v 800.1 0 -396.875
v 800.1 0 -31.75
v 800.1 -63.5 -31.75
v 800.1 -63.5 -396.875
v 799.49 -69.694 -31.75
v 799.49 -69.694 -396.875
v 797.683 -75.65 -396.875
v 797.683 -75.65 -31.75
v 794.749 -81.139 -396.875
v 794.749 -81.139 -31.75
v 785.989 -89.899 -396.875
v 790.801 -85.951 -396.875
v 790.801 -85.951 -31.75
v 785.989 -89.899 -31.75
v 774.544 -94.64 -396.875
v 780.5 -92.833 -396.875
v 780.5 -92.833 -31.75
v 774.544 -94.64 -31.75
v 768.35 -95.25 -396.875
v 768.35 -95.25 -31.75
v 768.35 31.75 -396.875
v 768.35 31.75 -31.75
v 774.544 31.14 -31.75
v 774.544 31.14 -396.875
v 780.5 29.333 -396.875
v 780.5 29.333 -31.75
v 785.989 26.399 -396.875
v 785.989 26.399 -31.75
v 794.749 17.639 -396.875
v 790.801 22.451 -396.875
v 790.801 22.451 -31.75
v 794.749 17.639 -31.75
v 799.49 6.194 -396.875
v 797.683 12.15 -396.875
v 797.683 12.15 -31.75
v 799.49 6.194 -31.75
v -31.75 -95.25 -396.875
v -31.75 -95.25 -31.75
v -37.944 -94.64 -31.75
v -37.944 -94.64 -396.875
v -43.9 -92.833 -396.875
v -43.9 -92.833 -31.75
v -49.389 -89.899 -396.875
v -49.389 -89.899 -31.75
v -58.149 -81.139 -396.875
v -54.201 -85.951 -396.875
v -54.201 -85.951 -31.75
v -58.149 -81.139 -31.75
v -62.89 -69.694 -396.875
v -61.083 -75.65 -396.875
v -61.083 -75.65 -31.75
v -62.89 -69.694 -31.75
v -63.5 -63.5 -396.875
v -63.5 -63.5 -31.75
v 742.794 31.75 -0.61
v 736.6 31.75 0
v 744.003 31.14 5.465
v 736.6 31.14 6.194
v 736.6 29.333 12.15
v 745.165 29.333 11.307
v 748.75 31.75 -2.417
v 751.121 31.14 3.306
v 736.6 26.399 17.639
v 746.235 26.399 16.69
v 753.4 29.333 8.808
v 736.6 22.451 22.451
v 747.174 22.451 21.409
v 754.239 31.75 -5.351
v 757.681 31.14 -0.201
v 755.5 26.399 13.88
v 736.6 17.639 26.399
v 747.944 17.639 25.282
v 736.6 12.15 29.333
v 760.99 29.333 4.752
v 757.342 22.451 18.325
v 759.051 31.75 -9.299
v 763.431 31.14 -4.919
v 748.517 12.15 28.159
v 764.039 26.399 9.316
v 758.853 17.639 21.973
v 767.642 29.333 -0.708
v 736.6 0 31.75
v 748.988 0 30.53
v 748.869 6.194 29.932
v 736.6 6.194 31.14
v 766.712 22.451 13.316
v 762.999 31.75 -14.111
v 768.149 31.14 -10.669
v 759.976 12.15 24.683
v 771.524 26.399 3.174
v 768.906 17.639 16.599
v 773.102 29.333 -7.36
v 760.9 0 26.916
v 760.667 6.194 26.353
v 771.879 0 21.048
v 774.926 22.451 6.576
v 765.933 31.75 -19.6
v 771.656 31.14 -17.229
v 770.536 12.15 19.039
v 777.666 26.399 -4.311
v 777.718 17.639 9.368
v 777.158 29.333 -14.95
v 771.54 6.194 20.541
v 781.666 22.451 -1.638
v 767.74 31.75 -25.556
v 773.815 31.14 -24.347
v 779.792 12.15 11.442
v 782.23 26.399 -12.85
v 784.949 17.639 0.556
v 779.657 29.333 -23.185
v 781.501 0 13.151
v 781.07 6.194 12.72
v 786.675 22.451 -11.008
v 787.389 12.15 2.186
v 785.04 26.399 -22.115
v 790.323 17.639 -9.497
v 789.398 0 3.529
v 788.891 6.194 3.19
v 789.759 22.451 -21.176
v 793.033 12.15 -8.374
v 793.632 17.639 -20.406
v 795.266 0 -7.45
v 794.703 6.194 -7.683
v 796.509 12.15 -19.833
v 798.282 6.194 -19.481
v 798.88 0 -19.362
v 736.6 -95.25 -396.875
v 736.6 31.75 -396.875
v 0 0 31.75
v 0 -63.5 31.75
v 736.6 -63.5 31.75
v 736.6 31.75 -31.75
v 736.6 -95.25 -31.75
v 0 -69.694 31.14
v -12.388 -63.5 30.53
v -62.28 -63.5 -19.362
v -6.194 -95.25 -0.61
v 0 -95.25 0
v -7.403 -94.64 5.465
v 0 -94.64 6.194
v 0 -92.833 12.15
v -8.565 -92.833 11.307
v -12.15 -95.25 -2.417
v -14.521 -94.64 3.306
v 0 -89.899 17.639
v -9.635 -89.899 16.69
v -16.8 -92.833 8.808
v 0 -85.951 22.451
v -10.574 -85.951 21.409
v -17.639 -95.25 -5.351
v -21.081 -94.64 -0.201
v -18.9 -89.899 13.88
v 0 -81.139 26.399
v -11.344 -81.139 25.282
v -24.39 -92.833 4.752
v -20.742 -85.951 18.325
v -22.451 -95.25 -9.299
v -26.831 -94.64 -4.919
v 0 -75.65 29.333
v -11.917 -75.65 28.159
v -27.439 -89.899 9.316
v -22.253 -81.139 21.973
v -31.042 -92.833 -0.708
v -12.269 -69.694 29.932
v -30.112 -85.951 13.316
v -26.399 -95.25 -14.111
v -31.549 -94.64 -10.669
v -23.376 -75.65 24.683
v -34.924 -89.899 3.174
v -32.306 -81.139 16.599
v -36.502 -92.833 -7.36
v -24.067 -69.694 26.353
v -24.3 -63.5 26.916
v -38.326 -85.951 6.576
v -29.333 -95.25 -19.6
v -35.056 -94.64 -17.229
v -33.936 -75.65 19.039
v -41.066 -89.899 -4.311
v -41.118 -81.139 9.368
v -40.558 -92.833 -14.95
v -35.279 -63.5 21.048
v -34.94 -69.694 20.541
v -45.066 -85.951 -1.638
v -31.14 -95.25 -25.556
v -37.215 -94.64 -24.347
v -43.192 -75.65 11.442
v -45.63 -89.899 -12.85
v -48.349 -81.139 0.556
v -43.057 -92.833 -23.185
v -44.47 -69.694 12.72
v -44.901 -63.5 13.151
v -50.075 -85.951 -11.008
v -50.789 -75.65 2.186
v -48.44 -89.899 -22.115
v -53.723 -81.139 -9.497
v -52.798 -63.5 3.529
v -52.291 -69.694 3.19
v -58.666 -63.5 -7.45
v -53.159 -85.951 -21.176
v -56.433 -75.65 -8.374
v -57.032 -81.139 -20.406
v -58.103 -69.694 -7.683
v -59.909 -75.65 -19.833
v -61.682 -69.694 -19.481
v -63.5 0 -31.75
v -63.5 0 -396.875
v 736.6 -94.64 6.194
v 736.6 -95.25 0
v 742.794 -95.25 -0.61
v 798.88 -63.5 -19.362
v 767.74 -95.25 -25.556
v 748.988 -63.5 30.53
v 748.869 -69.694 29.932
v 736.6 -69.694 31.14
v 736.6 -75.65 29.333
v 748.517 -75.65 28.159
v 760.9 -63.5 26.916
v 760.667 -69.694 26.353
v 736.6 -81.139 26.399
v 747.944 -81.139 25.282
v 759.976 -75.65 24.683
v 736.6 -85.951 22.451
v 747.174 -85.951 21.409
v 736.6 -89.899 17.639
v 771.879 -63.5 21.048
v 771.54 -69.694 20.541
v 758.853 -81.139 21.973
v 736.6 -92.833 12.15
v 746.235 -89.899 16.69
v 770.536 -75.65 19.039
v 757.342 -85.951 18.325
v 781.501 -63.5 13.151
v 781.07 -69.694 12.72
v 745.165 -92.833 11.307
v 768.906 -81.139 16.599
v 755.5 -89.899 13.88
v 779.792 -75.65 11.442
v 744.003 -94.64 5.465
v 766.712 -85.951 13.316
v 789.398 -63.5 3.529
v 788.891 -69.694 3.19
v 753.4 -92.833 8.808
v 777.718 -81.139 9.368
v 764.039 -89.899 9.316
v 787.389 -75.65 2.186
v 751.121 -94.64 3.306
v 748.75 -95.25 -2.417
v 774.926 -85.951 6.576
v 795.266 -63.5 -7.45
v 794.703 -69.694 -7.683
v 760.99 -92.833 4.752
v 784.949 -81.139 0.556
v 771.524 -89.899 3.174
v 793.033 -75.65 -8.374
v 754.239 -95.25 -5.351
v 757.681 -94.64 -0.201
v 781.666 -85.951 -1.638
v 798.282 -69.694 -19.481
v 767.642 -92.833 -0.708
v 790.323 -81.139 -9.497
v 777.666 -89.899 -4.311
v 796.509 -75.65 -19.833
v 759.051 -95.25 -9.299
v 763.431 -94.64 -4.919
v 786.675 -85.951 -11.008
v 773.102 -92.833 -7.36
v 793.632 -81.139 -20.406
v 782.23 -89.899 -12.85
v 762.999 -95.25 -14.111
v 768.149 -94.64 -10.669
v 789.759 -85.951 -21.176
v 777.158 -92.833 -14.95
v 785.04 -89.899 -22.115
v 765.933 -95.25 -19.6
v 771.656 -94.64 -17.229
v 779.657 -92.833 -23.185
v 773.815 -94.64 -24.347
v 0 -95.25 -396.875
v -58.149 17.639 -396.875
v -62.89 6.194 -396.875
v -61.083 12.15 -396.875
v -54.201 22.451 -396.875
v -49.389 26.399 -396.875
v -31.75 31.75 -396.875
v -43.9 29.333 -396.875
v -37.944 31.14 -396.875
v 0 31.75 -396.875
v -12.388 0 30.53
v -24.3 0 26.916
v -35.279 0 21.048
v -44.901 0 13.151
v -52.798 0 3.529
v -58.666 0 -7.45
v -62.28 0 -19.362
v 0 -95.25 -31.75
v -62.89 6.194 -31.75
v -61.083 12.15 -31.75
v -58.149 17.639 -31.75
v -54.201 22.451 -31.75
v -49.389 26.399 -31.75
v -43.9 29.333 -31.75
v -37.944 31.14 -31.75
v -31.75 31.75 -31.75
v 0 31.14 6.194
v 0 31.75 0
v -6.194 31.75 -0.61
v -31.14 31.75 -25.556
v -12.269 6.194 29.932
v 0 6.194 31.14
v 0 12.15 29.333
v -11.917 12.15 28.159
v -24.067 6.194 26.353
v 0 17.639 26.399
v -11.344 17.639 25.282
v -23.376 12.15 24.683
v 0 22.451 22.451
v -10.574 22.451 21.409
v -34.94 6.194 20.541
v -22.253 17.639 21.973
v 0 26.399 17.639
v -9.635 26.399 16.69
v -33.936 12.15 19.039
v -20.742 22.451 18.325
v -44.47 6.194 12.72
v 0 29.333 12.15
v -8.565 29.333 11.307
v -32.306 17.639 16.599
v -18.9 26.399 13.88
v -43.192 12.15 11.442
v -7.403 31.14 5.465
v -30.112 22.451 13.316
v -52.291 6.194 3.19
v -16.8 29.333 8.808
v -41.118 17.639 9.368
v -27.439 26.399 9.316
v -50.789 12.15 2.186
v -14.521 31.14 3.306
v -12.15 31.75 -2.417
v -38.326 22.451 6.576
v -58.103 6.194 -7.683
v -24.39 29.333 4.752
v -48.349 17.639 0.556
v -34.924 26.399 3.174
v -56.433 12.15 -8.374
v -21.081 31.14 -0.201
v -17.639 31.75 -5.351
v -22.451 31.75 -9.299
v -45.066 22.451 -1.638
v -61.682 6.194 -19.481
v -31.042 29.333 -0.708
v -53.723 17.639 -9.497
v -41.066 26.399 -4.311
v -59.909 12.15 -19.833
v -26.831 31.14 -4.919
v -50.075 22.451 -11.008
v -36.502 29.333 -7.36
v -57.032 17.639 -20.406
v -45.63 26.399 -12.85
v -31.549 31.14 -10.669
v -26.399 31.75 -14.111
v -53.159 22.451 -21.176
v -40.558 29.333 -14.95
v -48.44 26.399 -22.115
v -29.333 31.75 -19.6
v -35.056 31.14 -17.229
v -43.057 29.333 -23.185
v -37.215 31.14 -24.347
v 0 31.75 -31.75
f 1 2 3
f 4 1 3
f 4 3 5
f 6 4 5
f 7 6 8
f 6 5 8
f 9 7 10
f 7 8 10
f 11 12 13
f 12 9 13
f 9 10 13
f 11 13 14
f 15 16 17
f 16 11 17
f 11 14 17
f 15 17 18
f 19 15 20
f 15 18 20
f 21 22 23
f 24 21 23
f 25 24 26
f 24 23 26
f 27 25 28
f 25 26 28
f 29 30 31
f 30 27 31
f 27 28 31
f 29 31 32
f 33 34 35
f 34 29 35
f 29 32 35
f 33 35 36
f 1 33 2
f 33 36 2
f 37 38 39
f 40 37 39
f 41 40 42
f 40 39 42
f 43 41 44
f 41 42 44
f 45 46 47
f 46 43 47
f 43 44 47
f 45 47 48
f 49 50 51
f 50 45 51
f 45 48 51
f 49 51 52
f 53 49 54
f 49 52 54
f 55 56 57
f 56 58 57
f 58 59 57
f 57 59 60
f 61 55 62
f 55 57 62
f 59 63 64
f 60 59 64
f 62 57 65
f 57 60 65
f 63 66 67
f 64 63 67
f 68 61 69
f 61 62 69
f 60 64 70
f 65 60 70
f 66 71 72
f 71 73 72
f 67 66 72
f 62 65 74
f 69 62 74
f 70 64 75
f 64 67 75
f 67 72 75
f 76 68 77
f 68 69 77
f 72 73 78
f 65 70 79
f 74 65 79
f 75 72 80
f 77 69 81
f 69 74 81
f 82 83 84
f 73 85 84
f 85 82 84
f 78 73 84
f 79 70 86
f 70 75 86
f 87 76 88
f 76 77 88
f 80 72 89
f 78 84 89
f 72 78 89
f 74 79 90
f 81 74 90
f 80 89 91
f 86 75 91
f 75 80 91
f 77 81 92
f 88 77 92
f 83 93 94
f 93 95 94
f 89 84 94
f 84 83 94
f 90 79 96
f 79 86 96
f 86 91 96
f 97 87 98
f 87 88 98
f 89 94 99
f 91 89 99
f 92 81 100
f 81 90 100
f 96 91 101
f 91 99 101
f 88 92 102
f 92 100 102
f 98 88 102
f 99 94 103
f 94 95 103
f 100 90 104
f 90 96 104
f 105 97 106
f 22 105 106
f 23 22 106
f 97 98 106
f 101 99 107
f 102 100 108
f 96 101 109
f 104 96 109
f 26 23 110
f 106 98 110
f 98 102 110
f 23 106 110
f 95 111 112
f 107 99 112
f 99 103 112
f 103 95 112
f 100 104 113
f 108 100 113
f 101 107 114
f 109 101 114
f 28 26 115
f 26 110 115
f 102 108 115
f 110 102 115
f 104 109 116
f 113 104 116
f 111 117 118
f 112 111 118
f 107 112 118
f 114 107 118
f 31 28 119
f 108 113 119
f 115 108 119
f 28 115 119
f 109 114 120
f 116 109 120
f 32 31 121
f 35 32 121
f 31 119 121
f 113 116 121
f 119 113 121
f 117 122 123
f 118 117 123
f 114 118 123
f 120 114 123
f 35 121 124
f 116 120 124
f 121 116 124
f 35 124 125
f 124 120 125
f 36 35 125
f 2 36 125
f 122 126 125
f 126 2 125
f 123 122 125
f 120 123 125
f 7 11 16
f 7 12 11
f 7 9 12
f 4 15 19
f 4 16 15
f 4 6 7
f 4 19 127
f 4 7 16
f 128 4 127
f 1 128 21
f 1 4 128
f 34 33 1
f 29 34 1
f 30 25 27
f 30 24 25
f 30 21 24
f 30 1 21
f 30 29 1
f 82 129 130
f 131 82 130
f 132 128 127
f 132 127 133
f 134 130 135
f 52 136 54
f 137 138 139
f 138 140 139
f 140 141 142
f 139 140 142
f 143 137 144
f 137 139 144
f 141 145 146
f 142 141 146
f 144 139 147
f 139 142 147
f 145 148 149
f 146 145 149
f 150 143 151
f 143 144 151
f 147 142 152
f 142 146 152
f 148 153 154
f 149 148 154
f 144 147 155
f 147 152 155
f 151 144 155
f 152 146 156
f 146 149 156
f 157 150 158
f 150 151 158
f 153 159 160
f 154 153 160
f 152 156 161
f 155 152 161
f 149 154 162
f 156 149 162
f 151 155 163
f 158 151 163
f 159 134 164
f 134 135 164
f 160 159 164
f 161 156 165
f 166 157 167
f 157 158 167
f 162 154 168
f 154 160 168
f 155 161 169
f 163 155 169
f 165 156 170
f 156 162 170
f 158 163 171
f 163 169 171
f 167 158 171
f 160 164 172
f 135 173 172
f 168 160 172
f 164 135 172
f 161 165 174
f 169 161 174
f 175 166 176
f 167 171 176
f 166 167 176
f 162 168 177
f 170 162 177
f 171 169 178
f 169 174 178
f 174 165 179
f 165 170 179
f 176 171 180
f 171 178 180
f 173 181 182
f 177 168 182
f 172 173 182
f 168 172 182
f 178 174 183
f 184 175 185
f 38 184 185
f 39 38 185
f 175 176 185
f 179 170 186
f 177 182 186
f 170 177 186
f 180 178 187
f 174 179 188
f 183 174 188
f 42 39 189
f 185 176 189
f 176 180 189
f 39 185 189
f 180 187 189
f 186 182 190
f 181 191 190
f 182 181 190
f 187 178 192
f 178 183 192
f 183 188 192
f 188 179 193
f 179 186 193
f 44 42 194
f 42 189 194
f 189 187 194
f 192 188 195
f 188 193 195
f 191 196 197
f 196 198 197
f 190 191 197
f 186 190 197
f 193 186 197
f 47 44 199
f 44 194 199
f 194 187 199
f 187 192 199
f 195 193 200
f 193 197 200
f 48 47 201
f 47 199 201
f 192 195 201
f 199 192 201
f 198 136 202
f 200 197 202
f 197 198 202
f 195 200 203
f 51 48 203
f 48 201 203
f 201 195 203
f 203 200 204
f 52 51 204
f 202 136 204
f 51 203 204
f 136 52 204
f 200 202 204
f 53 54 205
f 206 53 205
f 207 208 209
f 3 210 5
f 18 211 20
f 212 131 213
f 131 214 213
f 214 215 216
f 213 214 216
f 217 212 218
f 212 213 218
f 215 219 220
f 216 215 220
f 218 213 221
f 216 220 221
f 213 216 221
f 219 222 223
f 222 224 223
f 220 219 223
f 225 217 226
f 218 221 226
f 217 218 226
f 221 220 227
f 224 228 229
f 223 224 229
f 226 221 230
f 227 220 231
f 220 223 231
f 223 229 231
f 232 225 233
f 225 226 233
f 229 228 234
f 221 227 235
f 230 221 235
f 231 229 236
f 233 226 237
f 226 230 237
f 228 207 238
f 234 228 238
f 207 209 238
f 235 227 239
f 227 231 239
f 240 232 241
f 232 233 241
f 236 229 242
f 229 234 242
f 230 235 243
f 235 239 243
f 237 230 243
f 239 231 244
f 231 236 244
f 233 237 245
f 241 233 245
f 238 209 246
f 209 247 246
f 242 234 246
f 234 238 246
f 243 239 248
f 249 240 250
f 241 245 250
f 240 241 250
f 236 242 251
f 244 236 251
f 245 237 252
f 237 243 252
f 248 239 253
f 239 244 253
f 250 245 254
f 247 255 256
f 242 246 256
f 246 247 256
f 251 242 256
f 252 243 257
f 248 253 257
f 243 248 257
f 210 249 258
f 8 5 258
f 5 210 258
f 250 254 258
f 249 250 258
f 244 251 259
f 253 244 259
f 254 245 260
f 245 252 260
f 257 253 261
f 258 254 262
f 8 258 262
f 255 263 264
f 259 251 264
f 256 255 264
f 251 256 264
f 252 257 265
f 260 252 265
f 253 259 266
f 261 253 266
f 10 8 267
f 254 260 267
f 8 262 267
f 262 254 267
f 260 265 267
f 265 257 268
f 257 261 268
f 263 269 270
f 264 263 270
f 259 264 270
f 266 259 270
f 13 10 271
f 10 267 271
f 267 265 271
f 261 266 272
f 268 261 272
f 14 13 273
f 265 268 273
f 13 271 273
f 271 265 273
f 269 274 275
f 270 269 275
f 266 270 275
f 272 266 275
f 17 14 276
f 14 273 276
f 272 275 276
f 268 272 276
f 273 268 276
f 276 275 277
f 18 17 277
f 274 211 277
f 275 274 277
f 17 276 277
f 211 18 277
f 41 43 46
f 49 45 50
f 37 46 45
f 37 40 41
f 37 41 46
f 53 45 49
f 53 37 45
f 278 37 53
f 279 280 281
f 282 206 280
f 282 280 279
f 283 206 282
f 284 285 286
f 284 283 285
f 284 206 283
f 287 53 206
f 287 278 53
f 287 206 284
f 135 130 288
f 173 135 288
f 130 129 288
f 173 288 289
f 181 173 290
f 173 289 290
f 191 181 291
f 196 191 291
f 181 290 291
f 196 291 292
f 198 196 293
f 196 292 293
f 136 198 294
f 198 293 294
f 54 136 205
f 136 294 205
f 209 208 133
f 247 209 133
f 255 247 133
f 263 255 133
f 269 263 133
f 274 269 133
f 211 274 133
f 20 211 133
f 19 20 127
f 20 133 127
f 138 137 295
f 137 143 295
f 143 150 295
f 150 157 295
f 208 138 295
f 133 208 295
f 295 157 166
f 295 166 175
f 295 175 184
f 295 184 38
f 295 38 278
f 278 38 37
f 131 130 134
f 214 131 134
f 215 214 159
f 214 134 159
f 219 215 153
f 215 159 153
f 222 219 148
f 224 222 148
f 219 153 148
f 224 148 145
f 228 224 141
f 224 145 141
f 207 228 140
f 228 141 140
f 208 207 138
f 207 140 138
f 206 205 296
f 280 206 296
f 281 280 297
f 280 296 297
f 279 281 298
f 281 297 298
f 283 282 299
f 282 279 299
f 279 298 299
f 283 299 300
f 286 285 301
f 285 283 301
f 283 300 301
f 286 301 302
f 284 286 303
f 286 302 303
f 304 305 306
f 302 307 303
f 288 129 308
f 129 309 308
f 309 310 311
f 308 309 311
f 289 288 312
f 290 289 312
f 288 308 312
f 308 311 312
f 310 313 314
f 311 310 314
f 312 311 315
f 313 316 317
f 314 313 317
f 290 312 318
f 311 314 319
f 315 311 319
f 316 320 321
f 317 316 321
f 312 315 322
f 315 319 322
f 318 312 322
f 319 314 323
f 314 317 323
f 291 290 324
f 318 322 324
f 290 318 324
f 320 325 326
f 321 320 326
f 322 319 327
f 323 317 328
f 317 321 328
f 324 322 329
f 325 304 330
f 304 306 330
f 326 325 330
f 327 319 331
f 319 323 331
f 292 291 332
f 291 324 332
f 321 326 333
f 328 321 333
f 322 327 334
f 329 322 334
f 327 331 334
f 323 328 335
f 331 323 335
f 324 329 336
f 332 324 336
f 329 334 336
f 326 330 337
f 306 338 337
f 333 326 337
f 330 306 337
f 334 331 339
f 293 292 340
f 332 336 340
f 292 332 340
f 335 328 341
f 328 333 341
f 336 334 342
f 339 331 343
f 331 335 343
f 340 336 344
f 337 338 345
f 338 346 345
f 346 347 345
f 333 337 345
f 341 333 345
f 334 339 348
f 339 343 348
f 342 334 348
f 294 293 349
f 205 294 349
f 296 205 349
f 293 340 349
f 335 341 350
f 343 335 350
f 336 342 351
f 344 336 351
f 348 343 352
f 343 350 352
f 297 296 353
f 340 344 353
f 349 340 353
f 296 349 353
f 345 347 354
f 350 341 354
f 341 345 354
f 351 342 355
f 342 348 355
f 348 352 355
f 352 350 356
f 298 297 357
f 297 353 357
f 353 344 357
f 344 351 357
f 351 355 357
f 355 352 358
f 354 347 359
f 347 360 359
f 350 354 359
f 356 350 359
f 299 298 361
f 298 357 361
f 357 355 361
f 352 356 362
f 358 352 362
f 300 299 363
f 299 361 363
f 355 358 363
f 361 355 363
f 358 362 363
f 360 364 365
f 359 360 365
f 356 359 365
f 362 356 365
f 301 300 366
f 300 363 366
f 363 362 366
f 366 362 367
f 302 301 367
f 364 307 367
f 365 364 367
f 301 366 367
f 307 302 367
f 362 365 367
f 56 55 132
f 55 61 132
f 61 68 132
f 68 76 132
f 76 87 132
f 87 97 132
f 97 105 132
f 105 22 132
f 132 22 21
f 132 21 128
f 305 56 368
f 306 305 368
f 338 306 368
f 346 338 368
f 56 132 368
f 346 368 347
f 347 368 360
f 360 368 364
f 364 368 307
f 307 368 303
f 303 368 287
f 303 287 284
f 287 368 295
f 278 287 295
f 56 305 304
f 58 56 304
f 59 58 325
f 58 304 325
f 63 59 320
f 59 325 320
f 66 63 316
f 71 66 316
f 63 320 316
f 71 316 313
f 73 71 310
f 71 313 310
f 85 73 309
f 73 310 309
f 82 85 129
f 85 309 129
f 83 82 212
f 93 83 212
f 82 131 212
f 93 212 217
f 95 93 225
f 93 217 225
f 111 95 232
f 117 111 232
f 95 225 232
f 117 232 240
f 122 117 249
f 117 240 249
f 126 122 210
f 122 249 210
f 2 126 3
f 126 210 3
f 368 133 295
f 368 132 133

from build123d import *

# Parameters (mm, degrees)
BOSS_EXTRUDE1_DEPTH = 736.6
REVOLVE13_ANGLE     = 90
REVOLVE12_ANGLE     = 90
BOSS_EXTRUDE3_DEPTH = 736.6
REVOLVE2_ANGLE      = 90
BOSS_EXTRUDE4_DEPTH = 736.6
REVOLVE10_ANGLE     = 90
BOSS_EXTRUDE5_DEPTH = 736.6
SKETCH16_W          = 434.975
SKETCH16_H          = 127
CUT_EXTRUDE1_DEPTH  = 1203.851588934


with BuildPart() as part:
    # Sketch1 → Boss-Extrude1 (new body)
    with BuildSketch(Plane(origin=(0, 0, 0), x_dir=(0, 0, -1), z_dir=(1, 0, 0))):
        with BuildLine():
            ThreePointArc((0, 31.75), (-22.450640303, 22.450640303), (-31.75, 0))
            Line((-31.75, 0), (-31.75, -63.5))
            ThreePointArc((-31.75, -63.5), (-22.450640303, -85.950640303), (0, -95.25))
            Line((0, -95.25), (31.75, -95.25))
            Line((31.75, -95.25), (31.75, 0))
            Line((31.75, 0), (31.75, 31.75))
            Line((31.75, 31.75), (0, 31.75))
        make_face()
    extrude(amount=BOSS_EXTRUDE1_DEPTH)



with BuildPart() as body_2:
    # Sketch8 → Revolve13 (revolve)
    with BuildSketch(Plane(origin=(736.6, 0, 0), x_dir=(0, 0, -1), z_dir=(1, 0, 0))):
        with BuildLine():
            Line((-31.75, 0), (-31.75, -63.5))
            ThreePointArc((-31.75, -63.5), (-22.450640303, -85.950640303), (0, -95.25))
            Line((0, -95.25), (31.75, -95.25))
            Line((31.75, -95.25), (31.75, 31.75))
            Line((31.75, 31.75), (0, 31.75))
            ThreePointArc((0, 31.75), (-22.450640303, 22.450640303), (-31.75, 0))
        make_face()
    revolve(axis=Axis((736.6, -95.25, -31.75), (0, 1, 0)), revolution_arc=REVOLVE13_ANGLE)


with BuildPart() as body_3:
    # Sketch15 → Revolve12 (revolve)
    with BuildSketch(Plane(origin=(0, 0, -31.75), x_dir=(0, 0, 1), z_dir=(-1, 0, 0))):
        with BuildLine():
            ThreePointArc((31.75, -95.25), (54.200640303, -85.950640303), (63.5, -63.5))
            Line((63.5, -63.5), (63.5, 0))
            ThreePointArc((63.5, 0), (54.200640303, 22.450640303), (31.75, 31.75))
            Line((31.75, 31.75), (0, 31.75))
            Line((0, 31.75), (0, -95.25))
            Line((0, -95.25), (31.75, -95.25))
        make_face()
    revolve(axis=Axis((0, 31.75, -31.75), (0, -1, 0)), revolution_arc=REVOLVE12_ANGLE)


with BuildPart() as part_1:
    add(part.part)

    add(body_2.part)  # Boss-Extrude3 merges body 2
    # Sketch7 → Boss-Extrude3 (add)
    with BuildSketch(Plane(origin=(0, 0, -31.75), x_dir=(-1, 0, 0), z_dir=(0, 0, -1))):
        with BuildLine():
            ThreePointArc((-768.35, 31.75), (-790.800640303, 22.450640303), (-800.1, 0))
            Line((-800.1, 0), (-800.1, -63.5))
            ThreePointArc((-800.1, -63.5), (-790.800640303, -85.950640303), (-768.35, -95.25))
            Line((-768.35, -95.25), (-736.6, -95.25))
            Line((-736.6, -95.25), (-736.6, 31.75))
            Line((-736.6, 31.75), (-768.35, 31.75))
        make_face()
    extrude(amount=BOSS_EXTRUDE3_DEPTH)

    # Sketch12 → Revolve2 (revolve)
    with BuildSketch(Plane(origin=(1454.15, 0, -768.35), x_dir=(-1, 0, 0), z_dir=(0, 0, -1))):
        with BuildLine():
            ThreePointArc((685.8, 31.75), (663.349359697, 22.450640303), (654.05, 0))
            Line((654.05, 0), (654.05, -63.5))
            ThreePointArc((654.05, -63.5), (663.349359697, -85.950640303), (685.8, -95.25))
            Line((685.8, -95.25), (717.55, -95.25))
            Line((717.55, -95.25), (717.55, 31.75))
            Line((717.55, 31.75), (685.8, 31.75))
        make_face()
    revolve(axis=Axis((736.6, -95.25, -768.35), (0, 1, 0)), revolution_arc=REVOLVE2_ANGLE)


    add(body_3.part)  # Boss-Extrude4 merges body 3
    # Sketch9 → Boss-Extrude4 (add)
    with BuildSketch(Plane(origin=(0, 0, -31.75), x_dir=(-1, 0, 0), z_dir=(0, 0, -1))):
        with BuildLine():
            Line((0, 31.75), (0, -95.25))
            Line((0, -95.25), (31.75, -95.25))
            ThreePointArc((31.75, -95.25), (54.200640303, -85.950640303), (63.5, -63.5))
            Line((63.5, -63.5), (63.5, 0))
            ThreePointArc((63.5, 0), (54.200640303, 22.450640303), (31.75, 31.75))
            Line((31.75, 31.75), (0, 31.75))
        make_face()
    extrude(amount=BOSS_EXTRUDE4_DEPTH)


with BuildPart() as body_2_2:
    # Sketch14 → Revolve10 (revolve)
    with BuildSketch(Plane(origin=(0, 0, -768.35), x_dir=(-1, 0, 0), z_dir=(0, 0, -1))):
        with BuildLine():
            Line((31.75, 31.75), (0, 31.75))
            Line((0, 31.75), (0, -95.25))
            Line((0, -95.25), (31.75, -95.25))
            ThreePointArc((31.75, -95.25), (54.200640303, -85.950640303), (63.5, -63.5))
            Line((63.5, -63.5), (63.5, 0))
            ThreePointArc((63.5, 0), (54.200640303, 22.450640303), (31.75, 31.75))
        make_face()
    revolve(axis=Axis((0, 31.75, -768.35), (0, -1, 0)), revolution_arc=REVOLVE10_ANGLE)


with BuildPart() as body_3_2:
    # Sketch10 → Boss-Extrude5 (new body)
    with BuildSketch(Plane(origin=(0, 0, 0), x_dir=(0, 0, -1), z_dir=(1, 0, 0))):
        with BuildLine():
            ThreePointArc((831.85, 0), (822.550640303, 22.450640303), (800.1, 31.75))
            Line((800.1, 31.75), (768.35, 31.75))
            Line((768.35, 31.75), (768.35, -95.25))
            Line((768.35, -95.25), (800.1, -95.25))
            ThreePointArc((800.1, -95.25), (822.550640303, -85.950640303), (831.85, -63.5))
            Line((831.85, -63.5), (831.85, 0))
        make_face()
    extrude(amount=BOSS_EXTRUDE5_DEPTH)


with BuildPart() as part_2:
    add(part_1.part)

    # Combine1: union body 3 2, body 2 2
    add(body_3_2.part)
    add(body_2_2.part)

    # Sketch16 → Cut-Extrude1 (cut, through all)
    with BuildSketch(Plane(origin=(800.1, 0, 0), x_dir=(0, 0, -1), z_dir=(1, 0, 0))):
        with Locations((614.3625, -31.75)):
            Rectangle(SKETCH16_W, SKETCH16_H)
    extrude(amount=-CUT_EXTRUDE1_DEPTH, mode=Mode.SUBTRACT)


solid = part_2.part
